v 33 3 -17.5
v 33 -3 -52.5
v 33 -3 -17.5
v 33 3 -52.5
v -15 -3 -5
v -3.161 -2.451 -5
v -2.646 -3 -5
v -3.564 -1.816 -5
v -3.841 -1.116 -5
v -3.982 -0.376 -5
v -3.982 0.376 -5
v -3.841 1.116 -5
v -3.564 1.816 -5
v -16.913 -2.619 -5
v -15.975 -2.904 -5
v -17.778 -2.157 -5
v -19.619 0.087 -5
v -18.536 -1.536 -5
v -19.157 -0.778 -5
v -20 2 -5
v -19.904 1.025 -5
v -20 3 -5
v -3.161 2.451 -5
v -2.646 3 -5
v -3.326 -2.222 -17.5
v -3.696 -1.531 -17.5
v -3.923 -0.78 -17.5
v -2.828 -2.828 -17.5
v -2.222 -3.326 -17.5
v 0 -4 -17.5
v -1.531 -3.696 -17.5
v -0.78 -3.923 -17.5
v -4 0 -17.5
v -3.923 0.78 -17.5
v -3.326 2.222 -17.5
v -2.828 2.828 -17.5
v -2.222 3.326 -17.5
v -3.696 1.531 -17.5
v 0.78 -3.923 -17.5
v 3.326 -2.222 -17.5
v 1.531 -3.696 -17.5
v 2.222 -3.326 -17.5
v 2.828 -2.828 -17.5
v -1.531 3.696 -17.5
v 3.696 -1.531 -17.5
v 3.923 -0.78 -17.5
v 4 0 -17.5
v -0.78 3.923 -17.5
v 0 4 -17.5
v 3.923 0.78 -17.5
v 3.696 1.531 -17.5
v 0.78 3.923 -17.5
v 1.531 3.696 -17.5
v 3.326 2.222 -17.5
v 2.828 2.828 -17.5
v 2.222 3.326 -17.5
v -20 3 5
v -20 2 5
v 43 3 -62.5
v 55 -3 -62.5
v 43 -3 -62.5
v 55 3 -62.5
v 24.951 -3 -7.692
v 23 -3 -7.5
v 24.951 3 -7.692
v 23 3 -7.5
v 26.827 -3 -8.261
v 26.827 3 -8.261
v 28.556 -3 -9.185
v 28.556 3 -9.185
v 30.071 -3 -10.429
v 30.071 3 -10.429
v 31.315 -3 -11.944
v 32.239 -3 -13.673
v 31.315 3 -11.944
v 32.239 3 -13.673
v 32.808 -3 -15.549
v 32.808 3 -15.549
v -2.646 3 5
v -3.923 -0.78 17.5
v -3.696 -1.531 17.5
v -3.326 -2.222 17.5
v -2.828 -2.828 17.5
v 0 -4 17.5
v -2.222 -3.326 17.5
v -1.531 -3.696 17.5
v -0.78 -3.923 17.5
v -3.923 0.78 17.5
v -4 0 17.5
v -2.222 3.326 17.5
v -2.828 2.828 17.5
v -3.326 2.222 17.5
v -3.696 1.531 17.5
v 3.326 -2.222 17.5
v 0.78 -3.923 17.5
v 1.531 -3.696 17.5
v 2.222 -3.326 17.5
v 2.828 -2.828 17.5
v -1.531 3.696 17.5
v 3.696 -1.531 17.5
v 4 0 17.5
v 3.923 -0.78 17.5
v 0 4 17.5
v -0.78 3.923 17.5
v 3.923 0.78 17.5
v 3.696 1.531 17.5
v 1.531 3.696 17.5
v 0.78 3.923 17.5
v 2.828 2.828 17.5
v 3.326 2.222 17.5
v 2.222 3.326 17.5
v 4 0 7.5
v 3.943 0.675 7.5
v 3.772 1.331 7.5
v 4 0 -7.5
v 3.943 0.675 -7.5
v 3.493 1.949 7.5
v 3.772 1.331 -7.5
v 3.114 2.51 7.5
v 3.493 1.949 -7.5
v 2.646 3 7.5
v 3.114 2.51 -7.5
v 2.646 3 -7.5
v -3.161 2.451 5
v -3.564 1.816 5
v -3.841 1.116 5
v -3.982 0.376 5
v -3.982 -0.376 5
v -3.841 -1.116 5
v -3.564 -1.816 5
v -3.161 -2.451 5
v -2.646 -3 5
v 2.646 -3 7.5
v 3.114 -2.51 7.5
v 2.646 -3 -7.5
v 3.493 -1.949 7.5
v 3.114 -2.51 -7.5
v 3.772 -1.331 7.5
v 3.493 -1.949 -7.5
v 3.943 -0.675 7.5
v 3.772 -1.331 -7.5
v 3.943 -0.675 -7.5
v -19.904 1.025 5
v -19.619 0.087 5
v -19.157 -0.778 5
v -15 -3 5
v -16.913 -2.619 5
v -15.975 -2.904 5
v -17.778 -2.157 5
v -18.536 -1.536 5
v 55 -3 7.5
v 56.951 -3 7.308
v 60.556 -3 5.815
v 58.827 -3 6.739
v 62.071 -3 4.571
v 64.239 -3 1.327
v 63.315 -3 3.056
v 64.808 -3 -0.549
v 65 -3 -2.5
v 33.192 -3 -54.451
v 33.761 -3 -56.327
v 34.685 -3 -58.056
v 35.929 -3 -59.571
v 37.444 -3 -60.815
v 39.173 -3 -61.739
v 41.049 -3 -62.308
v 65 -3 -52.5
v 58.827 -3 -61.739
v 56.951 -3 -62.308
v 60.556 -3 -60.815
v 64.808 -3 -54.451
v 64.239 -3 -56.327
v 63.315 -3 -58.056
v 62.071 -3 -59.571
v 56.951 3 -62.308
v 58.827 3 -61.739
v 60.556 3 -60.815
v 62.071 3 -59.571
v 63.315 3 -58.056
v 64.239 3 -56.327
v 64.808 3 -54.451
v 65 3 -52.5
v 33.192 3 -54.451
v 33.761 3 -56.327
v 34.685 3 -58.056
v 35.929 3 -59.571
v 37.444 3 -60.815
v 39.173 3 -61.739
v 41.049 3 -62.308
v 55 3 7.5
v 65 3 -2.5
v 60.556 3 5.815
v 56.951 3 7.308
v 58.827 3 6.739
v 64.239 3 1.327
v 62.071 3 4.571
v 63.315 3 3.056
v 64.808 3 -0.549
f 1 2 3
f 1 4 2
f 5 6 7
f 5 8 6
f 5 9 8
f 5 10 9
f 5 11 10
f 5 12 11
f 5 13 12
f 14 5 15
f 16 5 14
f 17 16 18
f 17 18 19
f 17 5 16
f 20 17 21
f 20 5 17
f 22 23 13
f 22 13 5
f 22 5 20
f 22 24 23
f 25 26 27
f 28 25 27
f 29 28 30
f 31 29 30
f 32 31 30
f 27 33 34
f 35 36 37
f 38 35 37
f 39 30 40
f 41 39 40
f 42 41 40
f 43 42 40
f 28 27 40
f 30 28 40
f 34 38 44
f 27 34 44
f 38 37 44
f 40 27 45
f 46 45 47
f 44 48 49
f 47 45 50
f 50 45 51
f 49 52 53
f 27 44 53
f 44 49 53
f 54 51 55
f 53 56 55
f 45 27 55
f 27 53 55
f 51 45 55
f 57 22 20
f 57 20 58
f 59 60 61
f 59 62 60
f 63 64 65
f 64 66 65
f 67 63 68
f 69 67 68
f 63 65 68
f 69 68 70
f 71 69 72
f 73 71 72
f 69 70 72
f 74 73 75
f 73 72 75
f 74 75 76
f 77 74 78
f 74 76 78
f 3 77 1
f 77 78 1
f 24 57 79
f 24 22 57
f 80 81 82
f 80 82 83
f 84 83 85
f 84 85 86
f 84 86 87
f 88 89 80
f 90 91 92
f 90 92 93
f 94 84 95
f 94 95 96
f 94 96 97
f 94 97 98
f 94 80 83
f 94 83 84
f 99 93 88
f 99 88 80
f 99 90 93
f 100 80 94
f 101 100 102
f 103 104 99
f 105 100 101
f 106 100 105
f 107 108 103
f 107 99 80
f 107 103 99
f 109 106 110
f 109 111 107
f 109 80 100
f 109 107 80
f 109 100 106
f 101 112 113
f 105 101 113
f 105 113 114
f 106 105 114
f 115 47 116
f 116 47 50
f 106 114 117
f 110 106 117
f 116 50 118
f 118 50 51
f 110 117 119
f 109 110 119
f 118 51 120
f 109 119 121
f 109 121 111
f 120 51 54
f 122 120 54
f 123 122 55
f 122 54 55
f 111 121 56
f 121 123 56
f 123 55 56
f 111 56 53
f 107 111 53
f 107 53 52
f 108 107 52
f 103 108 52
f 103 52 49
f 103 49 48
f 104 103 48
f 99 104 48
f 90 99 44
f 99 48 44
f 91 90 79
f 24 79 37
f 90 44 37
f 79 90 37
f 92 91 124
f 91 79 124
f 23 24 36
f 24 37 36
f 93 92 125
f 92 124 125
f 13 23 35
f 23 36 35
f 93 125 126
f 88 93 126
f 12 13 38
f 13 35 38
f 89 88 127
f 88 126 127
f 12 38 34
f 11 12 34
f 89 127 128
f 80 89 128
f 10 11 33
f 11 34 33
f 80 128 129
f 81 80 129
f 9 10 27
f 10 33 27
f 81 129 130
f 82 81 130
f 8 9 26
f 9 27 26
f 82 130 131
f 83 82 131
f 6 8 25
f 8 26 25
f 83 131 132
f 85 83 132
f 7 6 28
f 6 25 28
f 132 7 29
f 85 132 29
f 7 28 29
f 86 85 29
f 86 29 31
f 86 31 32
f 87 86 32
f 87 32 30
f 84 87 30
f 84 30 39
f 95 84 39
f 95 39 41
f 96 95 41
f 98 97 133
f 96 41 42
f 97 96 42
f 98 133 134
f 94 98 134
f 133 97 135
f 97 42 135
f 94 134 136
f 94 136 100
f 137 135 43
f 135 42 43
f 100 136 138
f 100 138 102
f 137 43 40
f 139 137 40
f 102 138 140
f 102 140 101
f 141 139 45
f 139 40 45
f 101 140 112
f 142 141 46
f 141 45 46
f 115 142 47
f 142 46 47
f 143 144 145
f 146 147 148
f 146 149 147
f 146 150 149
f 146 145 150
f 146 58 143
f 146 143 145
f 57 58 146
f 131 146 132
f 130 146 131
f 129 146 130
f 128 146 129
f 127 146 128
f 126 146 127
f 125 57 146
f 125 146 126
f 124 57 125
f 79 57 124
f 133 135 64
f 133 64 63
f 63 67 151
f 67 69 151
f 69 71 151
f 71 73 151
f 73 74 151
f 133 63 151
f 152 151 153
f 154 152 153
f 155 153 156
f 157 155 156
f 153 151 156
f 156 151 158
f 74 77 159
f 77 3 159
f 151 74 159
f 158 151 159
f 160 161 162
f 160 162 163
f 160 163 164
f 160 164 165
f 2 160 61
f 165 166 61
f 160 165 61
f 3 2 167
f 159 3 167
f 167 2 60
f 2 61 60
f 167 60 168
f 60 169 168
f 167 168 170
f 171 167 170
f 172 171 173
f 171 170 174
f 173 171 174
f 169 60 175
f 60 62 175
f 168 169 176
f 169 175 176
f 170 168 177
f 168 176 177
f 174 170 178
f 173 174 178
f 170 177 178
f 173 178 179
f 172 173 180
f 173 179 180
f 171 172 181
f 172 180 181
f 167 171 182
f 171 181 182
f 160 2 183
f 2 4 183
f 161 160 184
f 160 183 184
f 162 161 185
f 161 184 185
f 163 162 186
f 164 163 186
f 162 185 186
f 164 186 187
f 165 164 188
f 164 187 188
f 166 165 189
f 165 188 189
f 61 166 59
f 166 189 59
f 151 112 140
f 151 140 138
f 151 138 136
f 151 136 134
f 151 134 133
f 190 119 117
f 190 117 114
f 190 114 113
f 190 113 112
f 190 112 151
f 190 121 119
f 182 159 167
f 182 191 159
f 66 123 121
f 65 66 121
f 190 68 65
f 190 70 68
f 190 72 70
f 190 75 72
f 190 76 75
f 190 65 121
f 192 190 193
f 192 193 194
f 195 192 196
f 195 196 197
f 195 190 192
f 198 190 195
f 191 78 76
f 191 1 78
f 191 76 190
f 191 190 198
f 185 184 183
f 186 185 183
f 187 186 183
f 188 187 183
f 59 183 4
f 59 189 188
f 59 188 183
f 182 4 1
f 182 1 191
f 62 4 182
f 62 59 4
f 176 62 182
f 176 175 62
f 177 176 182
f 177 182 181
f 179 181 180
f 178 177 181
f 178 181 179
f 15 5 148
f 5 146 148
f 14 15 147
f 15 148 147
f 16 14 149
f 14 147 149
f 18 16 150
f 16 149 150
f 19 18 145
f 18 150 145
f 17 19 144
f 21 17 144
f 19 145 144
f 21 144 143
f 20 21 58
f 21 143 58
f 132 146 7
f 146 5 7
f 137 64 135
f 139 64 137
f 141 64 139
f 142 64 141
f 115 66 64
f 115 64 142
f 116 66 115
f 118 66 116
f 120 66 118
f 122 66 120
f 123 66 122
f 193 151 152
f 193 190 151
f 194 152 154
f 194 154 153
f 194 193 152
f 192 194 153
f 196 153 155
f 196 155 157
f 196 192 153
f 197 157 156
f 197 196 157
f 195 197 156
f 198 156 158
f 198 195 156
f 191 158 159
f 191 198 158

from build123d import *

# Parameters (mm, degrees)
BOSS_EXTRUDE4_DEPTH      = 3
BOSS_EXTRUDE5_DEPTH      = 10
BOSS_EXTRUDE5_DEPTH_BACK = 25
SKETCH10_R               = 4
FILLET4_R                = 10
FILLET5_R                = 5


with BuildPart() as part:
    # Sketch9 → Boss-Extrude4 (new, symmetric)
    with BuildSketch(Plane(origin=(0, 0, 0), x_dir=(1, 0, 0), z_dir=(0, 1, 0))):
        Polygon((0, -7.5), (65, -7.5), (65, 62.5), (33, 62.5), (33, 7.5), (0, 7.5), (0, 5), (-20, 5), (-20, -5), (0, -5), align=None)
    extrude(amount=BOSS_EXTRUDE4_DEPTH, both=True)

    # Sketch10 → Boss-Extrude5 (add, two sides: drawn at the far end of the back side and taken through both)
    with BuildSketch(Plane.XY.offset(7.5).offset(-BOSS_EXTRUDE5_DEPTH_BACK)):
        Circle(SKETCH10_R)
    extrude(amount=BOSS_EXTRUDE5_DEPTH + BOSS_EXTRUDE5_DEPTH_BACK)

    # Fillet4
    fillet4_edges = [part.edges().sort_by_distance(p)[0] for p in [
        (33, 0, -7.5),
        (33, 0, -62.5),
        (65, 0, -62.5),
        (65, 0, 7.5),
    ]]
    fillet(fillet4_edges, radius=FILLET4_R)

    # Fillet5
    fillet5_edges = [part.edges().sort_by_distance(p)[0] for p in [
        (-20, -3, 0),
    ]]
    fillet(fillet5_edges, radius=FILLET5_R)


solid = part.part
